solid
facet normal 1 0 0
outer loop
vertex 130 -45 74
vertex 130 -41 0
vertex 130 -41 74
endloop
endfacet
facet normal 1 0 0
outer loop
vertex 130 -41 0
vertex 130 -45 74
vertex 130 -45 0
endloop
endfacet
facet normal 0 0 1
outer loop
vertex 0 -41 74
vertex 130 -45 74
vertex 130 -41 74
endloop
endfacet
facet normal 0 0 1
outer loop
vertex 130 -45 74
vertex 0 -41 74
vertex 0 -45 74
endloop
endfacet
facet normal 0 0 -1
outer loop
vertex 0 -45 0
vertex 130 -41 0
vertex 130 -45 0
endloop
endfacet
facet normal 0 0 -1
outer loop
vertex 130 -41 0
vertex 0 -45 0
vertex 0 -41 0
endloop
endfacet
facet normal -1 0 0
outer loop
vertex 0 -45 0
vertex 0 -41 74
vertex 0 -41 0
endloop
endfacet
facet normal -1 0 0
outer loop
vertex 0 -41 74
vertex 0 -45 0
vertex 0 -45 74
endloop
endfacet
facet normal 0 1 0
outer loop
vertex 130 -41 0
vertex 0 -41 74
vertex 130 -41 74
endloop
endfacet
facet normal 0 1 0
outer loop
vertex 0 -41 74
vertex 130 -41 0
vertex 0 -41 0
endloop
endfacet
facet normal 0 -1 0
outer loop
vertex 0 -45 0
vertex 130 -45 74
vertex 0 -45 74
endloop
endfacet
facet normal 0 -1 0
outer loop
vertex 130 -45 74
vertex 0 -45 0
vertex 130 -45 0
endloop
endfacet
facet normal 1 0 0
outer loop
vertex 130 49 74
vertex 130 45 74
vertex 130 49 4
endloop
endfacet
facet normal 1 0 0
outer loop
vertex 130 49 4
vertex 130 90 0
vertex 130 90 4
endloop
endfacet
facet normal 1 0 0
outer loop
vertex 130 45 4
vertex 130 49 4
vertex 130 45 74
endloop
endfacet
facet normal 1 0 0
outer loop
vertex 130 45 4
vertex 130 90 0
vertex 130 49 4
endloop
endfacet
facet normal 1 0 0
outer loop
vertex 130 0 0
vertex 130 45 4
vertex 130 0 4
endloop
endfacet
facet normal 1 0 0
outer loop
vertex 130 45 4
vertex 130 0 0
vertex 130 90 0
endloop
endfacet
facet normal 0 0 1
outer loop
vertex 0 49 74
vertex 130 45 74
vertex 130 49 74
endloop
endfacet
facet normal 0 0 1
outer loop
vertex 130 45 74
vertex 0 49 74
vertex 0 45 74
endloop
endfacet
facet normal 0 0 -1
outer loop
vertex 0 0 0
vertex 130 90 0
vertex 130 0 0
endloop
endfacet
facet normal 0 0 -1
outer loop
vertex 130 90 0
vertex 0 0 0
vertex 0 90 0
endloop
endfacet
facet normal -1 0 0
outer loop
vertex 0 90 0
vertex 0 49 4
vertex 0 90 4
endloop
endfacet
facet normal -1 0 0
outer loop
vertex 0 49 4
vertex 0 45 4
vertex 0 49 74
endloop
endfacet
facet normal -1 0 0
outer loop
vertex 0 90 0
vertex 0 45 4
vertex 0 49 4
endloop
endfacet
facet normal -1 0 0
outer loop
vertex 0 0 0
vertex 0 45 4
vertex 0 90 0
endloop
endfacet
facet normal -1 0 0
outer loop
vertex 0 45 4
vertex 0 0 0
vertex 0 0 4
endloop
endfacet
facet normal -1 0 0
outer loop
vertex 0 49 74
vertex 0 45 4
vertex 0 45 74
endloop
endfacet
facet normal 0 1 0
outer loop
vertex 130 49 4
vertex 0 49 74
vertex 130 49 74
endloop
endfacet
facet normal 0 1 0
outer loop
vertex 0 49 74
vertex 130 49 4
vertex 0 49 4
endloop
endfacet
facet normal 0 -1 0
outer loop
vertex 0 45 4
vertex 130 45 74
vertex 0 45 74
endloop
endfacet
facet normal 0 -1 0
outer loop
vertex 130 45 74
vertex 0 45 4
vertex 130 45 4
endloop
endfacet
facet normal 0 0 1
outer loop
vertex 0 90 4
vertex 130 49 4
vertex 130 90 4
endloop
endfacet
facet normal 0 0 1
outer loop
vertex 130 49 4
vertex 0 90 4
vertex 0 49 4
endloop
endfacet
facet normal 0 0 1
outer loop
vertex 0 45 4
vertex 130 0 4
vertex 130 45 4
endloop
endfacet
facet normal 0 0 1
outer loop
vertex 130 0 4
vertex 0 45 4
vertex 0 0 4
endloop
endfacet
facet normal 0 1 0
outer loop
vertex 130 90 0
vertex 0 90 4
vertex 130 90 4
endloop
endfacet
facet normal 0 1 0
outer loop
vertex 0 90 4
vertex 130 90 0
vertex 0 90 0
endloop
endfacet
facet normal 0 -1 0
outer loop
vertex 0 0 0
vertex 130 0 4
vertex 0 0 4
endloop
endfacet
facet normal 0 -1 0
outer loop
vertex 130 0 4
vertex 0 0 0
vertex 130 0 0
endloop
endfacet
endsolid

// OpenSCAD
// Rack for six 50 mL conical (Falcon-type) tubes
// Print orientation: Upside down. Flat plate on bed (Z=0).
// After printing, flip over to stand on the two walls.

// --- Dimensions ---
// Plate dimensions
$plate_length = 130; // X dimension
$plate_width = 90;   // Y dimension
$plate_thickness = 4; // Z thickness

// Hole specifications
$hole_count = 6;
$hole_diameter = 30.5;
$hole_spacing_x = 40; // Centre-to-centre along X
$hole_spacing_y = 40; // Centre-to-centre along Y

// Wall specifications
$wall_length = 130;   // X dimension (matches plate length)
$wall_thickness = 4;  // Y dimension (matches plate width)
$wall_height = 70;    // Height from top of plate (Z = 4 to Z = 74)

// --- Configuration ---
$fn = 128; // High resolution for smooth holes and walls

// --- Main Module ---
module tube_rack() {
    union() {
        // 1. The Flat Plate
        // Lies on Z=0 to Z=4
        translate([0, 0, 0])
            cube([
                $plate_length,
                $plate_width,
                $plate_thickness
            ]);

        // 2. The Two Walls
        // Rise from Z=4 to Z=4+$wall_height
        // Located at the two long edges (Y = +/- plate_width/2)
        // We define the wall block to start at Z=0 to encompass the plate thickness
        // and then cut the holes through the entire height.
        
        // Wall positions: Along the two long edges (Y = +/- 45)
        $wall_y_positions = [-($plate_width/2), ($plate_width/2)];
        
        // Hole positions: 3 columns (X) x 2 rows (Y)
        $hole_x_positions = [-($hole_spacing_x/2), 0, ($hole_spacing_x/2)];
        $hole_y_positions = [-($hole_spacing_y/2), ($hole_spacing_y/2)];

        for (y_pos = $wall_y_positions) {
            translate([0, y_pos, 0])
                difference() {
                    // The wall block (including the part inside the plate)
                    translate([0, 0, 0])
                        cube([
                            $wall_length,
                            $wall_thickness,
                            $wall_height + $plate_thickness
                        ]);
                    
                    // Cut out the holes through the walls
                    // We extend the cut slightly to ensure clean removal
                    for (x_pos = $hole_x_positions) {
                        for (y_pos_h = $hole_y_positions) {
                            translate([x_pos, y_pos_h, 0])
                                cylinder(
                                    h = $wall_height + $plate_thickness + 0.1,
                                    d = $hole_diameter,
                                    $fn = $fn
                                );
                        }
                    }
                }
        }
    }
}

// Generate the part
tube_rack();
